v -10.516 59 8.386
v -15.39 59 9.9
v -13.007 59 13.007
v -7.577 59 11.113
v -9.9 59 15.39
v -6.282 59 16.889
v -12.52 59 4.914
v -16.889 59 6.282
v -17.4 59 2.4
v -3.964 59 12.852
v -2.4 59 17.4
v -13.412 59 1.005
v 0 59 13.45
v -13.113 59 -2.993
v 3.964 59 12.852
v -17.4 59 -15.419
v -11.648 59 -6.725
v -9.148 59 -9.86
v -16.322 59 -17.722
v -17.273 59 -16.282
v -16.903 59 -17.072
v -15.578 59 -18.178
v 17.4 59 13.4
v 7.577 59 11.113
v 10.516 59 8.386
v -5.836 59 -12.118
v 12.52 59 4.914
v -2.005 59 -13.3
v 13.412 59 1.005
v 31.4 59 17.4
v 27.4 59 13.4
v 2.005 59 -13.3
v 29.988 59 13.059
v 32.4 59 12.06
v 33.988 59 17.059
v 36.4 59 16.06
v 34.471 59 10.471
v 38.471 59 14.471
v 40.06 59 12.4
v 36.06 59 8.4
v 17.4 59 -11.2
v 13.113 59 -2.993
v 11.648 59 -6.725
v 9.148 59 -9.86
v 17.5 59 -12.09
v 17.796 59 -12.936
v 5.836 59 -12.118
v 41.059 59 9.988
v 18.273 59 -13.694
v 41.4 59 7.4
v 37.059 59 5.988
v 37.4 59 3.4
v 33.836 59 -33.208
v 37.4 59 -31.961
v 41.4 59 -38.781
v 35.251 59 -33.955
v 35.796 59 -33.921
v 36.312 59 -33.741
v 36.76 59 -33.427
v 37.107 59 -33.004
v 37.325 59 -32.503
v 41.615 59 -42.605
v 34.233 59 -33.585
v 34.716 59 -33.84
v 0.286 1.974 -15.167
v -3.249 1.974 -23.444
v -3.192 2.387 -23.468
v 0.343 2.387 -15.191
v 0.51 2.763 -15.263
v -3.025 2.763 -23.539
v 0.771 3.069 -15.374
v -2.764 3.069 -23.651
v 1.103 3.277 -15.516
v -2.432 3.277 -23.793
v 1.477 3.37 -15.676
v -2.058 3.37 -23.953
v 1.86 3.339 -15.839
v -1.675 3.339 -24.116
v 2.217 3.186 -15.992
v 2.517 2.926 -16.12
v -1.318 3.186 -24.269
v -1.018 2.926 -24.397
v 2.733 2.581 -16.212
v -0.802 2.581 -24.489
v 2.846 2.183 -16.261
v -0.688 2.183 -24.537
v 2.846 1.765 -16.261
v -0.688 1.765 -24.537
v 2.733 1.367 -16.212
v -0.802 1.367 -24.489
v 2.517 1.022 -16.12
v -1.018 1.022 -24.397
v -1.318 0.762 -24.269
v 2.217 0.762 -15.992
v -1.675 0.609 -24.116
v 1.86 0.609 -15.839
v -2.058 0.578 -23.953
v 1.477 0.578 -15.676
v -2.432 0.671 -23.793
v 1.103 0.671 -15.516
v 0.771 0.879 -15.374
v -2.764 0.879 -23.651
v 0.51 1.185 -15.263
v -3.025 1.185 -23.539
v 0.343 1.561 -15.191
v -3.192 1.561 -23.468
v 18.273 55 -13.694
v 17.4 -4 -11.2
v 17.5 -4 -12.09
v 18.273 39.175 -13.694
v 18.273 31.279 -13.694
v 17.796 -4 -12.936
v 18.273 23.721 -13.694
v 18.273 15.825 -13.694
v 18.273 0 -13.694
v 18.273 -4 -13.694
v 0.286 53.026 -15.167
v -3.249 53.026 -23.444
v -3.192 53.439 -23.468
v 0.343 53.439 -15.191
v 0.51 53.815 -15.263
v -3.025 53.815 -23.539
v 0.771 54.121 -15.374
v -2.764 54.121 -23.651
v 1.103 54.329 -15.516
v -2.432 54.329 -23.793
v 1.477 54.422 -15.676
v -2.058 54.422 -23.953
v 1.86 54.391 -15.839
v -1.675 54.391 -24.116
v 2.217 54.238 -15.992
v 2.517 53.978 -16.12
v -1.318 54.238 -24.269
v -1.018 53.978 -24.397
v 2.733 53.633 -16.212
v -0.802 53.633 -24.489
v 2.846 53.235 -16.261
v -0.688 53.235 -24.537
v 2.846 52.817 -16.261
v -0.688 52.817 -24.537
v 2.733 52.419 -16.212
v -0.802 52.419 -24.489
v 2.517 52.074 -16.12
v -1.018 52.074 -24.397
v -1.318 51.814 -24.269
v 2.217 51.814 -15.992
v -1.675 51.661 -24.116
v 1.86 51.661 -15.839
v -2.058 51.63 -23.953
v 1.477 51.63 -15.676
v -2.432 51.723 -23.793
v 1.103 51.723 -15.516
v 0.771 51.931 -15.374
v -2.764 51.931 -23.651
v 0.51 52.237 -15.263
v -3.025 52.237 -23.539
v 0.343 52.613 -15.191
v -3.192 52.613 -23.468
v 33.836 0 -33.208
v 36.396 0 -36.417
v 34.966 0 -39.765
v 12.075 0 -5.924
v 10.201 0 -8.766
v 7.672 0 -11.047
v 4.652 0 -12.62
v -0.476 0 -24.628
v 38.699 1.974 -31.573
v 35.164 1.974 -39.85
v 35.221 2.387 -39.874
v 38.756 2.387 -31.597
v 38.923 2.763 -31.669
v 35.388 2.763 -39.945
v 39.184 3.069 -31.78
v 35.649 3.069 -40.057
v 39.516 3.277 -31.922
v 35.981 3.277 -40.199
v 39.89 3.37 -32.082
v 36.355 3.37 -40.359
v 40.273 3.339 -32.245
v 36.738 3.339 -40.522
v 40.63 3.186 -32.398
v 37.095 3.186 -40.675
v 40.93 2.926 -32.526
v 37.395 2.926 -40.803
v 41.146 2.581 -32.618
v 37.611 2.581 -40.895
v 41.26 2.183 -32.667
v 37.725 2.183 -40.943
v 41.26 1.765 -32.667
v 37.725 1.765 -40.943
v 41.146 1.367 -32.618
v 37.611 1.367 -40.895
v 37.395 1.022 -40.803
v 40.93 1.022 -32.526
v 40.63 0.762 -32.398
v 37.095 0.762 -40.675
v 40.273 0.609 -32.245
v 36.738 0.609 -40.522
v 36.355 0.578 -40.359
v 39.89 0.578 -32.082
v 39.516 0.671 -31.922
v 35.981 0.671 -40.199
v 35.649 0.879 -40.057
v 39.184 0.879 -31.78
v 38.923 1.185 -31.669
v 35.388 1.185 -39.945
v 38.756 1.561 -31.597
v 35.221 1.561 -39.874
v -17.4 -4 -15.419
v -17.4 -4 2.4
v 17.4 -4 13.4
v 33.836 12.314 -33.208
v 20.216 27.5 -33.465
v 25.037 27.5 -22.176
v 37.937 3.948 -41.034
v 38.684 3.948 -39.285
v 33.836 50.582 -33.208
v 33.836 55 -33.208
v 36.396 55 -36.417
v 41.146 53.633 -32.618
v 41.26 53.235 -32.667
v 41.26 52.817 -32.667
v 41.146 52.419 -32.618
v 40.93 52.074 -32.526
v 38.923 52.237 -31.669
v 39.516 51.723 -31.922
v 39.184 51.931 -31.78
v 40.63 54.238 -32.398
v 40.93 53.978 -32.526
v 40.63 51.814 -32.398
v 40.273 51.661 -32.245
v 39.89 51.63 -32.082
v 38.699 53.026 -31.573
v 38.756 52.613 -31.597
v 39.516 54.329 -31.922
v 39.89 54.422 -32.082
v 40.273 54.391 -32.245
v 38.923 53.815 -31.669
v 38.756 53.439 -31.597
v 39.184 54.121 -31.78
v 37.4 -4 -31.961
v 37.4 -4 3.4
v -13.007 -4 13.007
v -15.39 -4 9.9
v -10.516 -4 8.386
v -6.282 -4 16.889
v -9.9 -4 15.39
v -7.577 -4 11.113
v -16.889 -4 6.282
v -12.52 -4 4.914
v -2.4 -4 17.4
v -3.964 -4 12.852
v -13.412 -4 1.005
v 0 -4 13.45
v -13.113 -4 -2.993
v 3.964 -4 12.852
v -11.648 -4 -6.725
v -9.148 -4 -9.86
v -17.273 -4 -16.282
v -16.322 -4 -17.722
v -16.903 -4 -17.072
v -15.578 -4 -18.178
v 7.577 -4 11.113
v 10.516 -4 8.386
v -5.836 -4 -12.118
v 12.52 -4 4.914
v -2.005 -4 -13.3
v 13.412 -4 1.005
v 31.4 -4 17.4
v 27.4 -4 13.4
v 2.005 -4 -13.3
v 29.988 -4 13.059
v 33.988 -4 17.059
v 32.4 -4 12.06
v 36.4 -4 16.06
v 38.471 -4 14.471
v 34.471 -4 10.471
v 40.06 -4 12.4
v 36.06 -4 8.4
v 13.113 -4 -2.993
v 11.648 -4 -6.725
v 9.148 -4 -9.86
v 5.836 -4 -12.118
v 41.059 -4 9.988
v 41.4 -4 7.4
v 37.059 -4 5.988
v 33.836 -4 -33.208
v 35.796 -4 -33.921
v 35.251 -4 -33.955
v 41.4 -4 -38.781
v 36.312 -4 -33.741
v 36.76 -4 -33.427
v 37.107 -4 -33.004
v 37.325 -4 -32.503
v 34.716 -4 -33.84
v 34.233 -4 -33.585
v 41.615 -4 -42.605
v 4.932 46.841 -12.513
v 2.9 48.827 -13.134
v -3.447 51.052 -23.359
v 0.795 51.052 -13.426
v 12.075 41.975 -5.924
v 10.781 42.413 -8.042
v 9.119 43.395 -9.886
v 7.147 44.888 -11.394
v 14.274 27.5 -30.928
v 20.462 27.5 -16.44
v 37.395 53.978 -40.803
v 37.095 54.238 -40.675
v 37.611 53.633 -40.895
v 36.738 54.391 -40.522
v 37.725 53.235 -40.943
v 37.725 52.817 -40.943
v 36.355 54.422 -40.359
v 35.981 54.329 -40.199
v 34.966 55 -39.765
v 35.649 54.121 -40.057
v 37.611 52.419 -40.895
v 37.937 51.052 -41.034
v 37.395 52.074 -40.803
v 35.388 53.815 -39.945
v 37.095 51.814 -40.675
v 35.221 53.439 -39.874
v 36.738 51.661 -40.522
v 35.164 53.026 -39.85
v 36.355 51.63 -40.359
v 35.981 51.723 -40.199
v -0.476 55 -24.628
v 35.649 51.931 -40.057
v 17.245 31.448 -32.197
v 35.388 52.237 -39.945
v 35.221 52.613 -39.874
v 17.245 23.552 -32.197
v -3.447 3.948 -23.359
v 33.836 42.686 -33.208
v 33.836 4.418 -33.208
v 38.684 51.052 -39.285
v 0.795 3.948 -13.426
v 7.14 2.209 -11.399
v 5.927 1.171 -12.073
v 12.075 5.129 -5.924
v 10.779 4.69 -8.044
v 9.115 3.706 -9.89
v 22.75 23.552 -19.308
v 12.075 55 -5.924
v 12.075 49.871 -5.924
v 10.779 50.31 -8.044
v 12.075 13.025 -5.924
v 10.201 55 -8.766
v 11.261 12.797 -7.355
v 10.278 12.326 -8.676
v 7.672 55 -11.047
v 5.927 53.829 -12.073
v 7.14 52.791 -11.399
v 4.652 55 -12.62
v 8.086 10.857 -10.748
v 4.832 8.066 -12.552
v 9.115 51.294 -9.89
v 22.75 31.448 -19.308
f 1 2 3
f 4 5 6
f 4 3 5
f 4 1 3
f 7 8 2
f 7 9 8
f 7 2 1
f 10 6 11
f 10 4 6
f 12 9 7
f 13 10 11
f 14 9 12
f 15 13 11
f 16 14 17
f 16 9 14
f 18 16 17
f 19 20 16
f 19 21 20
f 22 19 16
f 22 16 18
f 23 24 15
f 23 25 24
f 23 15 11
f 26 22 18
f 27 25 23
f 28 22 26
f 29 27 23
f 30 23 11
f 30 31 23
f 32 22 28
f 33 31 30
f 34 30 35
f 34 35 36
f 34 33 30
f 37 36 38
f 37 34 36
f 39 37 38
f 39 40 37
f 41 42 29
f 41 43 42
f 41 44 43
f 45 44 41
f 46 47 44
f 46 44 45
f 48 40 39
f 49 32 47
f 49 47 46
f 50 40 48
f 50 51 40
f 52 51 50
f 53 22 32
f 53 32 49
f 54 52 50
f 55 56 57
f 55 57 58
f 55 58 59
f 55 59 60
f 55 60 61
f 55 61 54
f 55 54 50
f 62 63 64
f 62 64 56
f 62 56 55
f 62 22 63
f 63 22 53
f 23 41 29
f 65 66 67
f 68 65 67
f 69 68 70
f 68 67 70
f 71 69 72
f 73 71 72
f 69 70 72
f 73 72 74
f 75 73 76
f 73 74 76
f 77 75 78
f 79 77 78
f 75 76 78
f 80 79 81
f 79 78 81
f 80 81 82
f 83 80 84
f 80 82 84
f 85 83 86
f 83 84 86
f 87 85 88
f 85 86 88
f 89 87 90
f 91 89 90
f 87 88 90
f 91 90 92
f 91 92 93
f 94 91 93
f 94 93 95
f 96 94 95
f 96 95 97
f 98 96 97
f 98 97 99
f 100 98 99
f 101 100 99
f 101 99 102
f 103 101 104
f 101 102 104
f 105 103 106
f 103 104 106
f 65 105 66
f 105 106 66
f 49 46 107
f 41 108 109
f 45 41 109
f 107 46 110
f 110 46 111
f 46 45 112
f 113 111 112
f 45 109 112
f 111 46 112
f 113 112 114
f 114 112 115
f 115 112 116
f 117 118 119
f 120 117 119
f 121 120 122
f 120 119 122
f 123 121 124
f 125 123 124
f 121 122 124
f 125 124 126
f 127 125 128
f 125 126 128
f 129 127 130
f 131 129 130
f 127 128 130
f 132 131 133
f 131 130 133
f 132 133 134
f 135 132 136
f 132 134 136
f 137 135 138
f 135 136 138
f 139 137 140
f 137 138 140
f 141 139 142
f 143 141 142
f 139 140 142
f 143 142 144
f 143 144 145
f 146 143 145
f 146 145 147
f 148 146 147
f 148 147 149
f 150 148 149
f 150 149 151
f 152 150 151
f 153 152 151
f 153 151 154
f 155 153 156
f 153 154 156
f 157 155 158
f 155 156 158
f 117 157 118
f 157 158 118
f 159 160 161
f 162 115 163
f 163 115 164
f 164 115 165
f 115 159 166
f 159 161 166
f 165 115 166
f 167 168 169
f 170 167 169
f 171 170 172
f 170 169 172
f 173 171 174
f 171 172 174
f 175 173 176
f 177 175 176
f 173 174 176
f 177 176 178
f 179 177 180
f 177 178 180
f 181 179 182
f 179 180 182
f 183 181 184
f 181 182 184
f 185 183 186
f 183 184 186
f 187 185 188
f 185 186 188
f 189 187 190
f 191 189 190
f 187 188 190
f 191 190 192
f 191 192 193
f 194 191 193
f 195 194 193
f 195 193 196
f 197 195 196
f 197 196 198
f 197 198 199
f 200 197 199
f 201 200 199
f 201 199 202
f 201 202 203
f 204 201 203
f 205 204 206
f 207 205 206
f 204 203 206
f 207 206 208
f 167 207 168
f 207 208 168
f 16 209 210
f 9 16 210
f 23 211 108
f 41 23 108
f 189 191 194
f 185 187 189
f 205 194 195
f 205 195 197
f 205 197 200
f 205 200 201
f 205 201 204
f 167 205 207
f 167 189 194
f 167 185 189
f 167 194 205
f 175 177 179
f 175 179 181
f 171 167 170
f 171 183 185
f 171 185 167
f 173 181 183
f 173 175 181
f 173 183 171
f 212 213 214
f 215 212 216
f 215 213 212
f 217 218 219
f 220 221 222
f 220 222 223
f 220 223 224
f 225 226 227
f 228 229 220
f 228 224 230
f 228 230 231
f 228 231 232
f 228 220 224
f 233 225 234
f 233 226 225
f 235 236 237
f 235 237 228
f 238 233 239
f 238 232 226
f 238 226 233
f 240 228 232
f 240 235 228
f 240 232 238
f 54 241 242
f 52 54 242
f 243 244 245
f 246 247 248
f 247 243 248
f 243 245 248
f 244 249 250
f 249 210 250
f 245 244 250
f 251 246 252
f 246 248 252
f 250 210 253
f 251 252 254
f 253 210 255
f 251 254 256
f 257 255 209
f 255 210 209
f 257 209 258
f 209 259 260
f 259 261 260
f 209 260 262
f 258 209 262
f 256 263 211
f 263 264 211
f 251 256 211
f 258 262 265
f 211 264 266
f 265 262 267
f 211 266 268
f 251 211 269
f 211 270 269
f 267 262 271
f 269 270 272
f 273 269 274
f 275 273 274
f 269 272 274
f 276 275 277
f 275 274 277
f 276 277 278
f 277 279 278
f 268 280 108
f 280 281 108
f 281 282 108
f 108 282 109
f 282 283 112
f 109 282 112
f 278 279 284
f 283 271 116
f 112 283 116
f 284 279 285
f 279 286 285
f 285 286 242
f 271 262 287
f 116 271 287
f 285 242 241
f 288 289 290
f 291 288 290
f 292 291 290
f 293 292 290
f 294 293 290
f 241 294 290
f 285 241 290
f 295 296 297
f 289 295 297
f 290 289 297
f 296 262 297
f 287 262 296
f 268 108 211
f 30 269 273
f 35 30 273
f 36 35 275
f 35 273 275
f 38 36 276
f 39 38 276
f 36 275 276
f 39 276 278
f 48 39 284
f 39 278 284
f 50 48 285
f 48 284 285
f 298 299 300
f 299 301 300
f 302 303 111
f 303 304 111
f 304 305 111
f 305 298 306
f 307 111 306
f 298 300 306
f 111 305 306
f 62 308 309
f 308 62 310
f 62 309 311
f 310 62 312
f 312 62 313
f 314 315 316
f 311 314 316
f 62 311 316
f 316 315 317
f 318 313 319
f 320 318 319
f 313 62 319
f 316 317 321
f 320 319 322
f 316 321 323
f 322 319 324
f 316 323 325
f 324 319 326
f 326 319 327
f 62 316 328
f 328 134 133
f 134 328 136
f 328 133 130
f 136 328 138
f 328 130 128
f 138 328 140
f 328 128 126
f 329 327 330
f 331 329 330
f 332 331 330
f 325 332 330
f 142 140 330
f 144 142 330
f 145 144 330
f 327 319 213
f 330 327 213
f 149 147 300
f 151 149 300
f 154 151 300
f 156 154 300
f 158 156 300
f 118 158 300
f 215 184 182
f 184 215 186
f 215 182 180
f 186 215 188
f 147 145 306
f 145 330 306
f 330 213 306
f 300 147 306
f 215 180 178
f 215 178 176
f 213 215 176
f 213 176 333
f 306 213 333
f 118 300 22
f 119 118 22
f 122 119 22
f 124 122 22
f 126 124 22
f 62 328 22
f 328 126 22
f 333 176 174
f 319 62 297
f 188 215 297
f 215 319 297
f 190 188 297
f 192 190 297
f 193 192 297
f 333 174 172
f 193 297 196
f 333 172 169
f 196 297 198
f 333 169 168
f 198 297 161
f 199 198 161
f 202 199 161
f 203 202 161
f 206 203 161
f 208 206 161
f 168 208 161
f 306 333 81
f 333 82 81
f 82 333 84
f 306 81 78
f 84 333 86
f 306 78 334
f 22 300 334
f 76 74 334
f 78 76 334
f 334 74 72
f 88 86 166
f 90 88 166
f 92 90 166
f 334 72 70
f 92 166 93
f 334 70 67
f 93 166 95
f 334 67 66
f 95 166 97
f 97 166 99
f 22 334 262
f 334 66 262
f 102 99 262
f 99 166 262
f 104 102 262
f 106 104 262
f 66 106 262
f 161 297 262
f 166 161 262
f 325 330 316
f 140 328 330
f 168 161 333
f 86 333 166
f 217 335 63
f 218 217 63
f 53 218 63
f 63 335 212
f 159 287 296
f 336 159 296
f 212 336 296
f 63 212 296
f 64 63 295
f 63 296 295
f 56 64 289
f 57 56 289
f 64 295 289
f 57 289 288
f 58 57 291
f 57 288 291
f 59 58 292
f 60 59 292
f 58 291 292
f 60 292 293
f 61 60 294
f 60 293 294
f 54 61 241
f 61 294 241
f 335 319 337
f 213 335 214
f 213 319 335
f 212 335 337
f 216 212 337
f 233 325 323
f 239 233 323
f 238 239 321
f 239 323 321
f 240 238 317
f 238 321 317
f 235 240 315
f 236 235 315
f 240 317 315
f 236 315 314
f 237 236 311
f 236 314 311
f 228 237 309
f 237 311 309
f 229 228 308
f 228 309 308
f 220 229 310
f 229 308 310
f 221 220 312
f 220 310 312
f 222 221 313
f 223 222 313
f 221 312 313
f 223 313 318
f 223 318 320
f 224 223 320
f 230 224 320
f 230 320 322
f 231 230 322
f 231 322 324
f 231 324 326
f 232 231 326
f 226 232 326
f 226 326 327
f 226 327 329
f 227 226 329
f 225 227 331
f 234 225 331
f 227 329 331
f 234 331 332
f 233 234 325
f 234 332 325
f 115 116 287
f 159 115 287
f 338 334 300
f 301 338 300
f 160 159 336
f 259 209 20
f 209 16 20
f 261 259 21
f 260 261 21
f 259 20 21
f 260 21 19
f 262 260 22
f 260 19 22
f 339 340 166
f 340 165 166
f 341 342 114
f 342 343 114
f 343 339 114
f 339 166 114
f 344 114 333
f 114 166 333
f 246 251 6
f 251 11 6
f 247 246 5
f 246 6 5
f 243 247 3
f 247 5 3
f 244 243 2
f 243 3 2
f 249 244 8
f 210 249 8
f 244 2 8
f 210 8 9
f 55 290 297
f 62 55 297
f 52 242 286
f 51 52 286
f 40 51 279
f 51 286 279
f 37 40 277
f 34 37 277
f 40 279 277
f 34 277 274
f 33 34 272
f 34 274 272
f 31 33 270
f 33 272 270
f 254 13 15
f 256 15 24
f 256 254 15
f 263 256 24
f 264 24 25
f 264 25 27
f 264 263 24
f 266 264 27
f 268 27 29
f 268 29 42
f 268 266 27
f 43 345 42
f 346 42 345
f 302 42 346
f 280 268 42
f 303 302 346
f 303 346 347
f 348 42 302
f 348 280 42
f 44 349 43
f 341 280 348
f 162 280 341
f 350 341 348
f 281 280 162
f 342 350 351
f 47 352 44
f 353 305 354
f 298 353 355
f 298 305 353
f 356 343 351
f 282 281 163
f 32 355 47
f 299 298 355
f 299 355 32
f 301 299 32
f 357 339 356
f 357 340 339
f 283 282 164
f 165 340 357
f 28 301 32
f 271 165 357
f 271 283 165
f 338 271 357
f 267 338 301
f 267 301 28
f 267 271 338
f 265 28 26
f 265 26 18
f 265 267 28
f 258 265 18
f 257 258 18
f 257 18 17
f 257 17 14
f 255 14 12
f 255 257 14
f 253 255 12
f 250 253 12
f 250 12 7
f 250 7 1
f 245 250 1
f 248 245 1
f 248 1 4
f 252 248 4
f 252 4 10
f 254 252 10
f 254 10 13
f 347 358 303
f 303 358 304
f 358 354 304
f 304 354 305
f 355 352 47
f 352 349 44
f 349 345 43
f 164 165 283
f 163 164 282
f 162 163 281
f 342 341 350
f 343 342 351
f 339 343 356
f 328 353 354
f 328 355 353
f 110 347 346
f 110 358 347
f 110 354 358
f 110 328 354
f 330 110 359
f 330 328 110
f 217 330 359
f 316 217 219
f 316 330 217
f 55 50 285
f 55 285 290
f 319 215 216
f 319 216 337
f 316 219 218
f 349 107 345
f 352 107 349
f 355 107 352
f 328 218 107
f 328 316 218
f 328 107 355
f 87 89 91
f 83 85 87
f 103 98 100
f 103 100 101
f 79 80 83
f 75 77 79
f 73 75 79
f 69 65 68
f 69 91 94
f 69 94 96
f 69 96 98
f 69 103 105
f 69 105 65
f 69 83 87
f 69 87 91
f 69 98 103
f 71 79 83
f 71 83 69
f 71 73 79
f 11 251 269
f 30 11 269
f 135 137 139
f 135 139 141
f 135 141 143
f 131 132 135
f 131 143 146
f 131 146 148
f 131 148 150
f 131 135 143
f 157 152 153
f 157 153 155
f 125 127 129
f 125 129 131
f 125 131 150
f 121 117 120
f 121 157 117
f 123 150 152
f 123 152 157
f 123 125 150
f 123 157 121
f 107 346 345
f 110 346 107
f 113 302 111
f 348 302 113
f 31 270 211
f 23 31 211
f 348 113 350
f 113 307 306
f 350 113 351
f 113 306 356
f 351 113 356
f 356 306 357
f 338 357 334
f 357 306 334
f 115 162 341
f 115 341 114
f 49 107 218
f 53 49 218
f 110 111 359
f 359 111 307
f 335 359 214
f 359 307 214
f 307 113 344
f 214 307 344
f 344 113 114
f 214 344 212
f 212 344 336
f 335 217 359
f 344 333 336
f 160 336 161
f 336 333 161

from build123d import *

# Parameters (mm, degrees)
BOSS_EXTRUDE1_DEPTH            = 59
BOSS_EXTRUDE1_DEPTH_BACK       = 4
SKETCH2_R                      = 13.45
FILLET1_R                      = 15
FILLET2_R                      = 3
CUT_EXTRUDE1_REACH             = 88.686
CUT_EXTRUDE1_DIRECTION_2_DEPTH = 87.685720739
SKETCH4_R                      = 1.4
CUT_EXTRUDE2_DEPTH             = 9


with BuildPart() as part:
    # Sketch2 → Boss-Extrude1 (new, two sides: drawn at the far end of the back side and taken through both)
    with BuildSketch(Plane(origin=(0, 0, 0), x_dir=(1, 0, 0), z_dir=(0, 1, 0)).offset(-BOSS_EXTRUDE1_DEPTH_BACK)):
        with BuildLine():
            Line((-17.4, -17.4), (17.4, -17.4))
            Line((17.4, -17.4), (31.4, -17.4))
            ThreePointArc((31.4, -17.4), (38.471067812, -14.471067812), (41.4, -7.4))
            Line((41.4, -7.4), (41.4, 38.781202895))
            Line((41.4, 38.781202895), (41.615303514, 42.605074323))
            Line((41.615303514, 42.605074323), (-17.4, 17.4))
            Line((-17.4, 17.4), (-17.4, -17.4))
        make_face()
        with Locations(Location((0, 0, 0), (0, 0, 270))):
            Circle(SKETCH2_R, mode=Mode.SUBTRACT)
        with BuildLine():
            Line((17.4, -13.4), (17.4, 11.200201908))
            ThreePointArc((17.4, 11.200201908), (17.624507156, 12.521433828), (18.272826893, 13.694352737))
            Line((18.272826893, 13.694352737), (33.836413447, 33.208019968))
            ThreePointArc((33.836413447, 33.208019968), (36.06061596, 33.848690975), (37.4, 31.960944553))
            Line((37.4, 31.960944553), (37.4, -3.4))
            ThreePointArc((37.4, -3.4), (34.471067812, -10.471067812), (27.4, -13.4))
            Line((27.4, -13.4), (17.4, -13.4))
        make_face(mode=Mode.SUBTRACT)
    extrude(amount=BOSS_EXTRUDE1_DEPTH + BOSS_EXTRUDE1_DEPTH_BACK)

    # Fillet1
    fillet1_edges = [part.edges().sort_by_distance(p)[0] for p in [
        (-17.4, 27.5, 17.4),
    ]]
    fillet(fillet1_edges, radius=FILLET1_R)

    # Fillet2
    fillet2_edges = [part.edges().sort_by_distance(p)[0] for p in [
        (-17.4, 27.5, -17.4),
    ]]
    fillet(fillet2_edges, radius=FILLET2_R)

    # Cut-Extrude1: up to this plane
    cut_extrude1_end = Plane(origin=(18.272826893, -4, -13.694352737), z_dir=(-0.7817932766673829, 0, -0.6235377074064384))
    # Sketch3 → Cut-Extrude1 (cut, up to the surface)
    with BuildSketch(Plane(origin=(-8.969274917, 0, -21.000710996), x_dir=(-0.9196362986724037, 0, 0.39277102510765927), z_dir=(-0.39277102510765927, 0, -0.9196362986724037)), mode=Mode.PRIVATE) as cut_extrude1_sk1:
        Polygon((-47.774830044, 0), (-9.235134773, 0), (-28.504982408, 23.552035999), align=None)
    cut_extrude1_tool1 = split(extrude(cut_extrude1_sk1.sketch, amount=-CUT_EXTRUDE1_REACH, mode=Mode.PRIVATE), bisect_by=cut_extrude1_end, keep=Keep.BOTH, mode=Mode.PRIVATE)
    add(cut_extrude1_tool1.solids().sort_by_distance((17.244942, 7.850679, -32.196642))[0], mode=Mode.SUBTRACT)
    # Sketch3 → Cut-Extrude1 (cut, up to the surface)
    with BuildSketch(Plane(origin=(-8.969274917, 0, -21.000710996), x_dir=(-0.9196362986724037, 0, 0.39277102510765927), z_dir=(-0.39277102510765927, 0, -0.9196362986724037)), mode=Mode.PRIVATE) as cut_extrude1_sk2:
        Polygon((-51.004982408, 3.947964001), (-51.004982408, 51.052035999), (-31.735134773, 27.5), align=None)
    cut_extrude1_tool2 = split(extrude(cut_extrude1_sk2.sketch, amount=-CUT_EXTRUDE1_REACH, mode=Mode.PRIVATE), bisect_by=cut_extrude1_end, keep=Keep.BOTH, mode=Mode.PRIVATE)
    add(cut_extrude1_tool2.solids().sort_by_distance((32.029675, 27.5, -38.511111))[0], mode=Mode.SUBTRACT)
    # Sketch3 → Cut-Extrude1 (cut, up to the surface)
    with BuildSketch(Plane(origin=(-8.969274917, 0, -21.000710996), x_dir=(-0.9196362986724037, 0, 0.39277102510765927), z_dir=(-0.39277102510765927, 0, -0.9196362986724037)), mode=Mode.PRIVATE) as cut_extrude1_sk3:
        Polygon((-47.774830044, 55), (-9.235134773, 55), (-28.504982408, 31.447964001), align=None)
    cut_extrude1_tool3 = split(extrude(cut_extrude1_sk3.sketch, amount=-CUT_EXTRUDE1_REACH, mode=Mode.PRIVATE), bisect_by=cut_extrude1_end, keep=Keep.BOTH, mode=Mode.PRIVATE)
    add(cut_extrude1_tool3.solids().sort_by_distance((17.244942, 47.149321, -32.196642))[0], mode=Mode.SUBTRACT)
    # Sketch3 → Cut-Extrude1 (cut, up to the surface)
    with BuildSketch(Plane(origin=(-8.969274917, 0, -21.000710996), x_dir=(-0.9196362986724037, 0, 0.39277102510765927), z_dir=(-0.39277102510765927, 0, -0.9196362986724037)), mode=Mode.PRIVATE) as cut_extrude1_sk4:
        Polygon((-6.004982408, 3.947964001), (-6.004982408, 51.052035999), (-25.274830044, 27.5), align=None)
    cut_extrude1_tool4 = split(extrude(cut_extrude1_sk4.sketch, amount=-CUT_EXTRUDE1_REACH, mode=Mode.PRIVATE), bisect_by=cut_extrude1_end, keep=Keep.BOTH, mode=Mode.PRIVATE)
    add(cut_extrude1_tool4.solids().sort_by_distance((2.460209, 27.5, -25.882173))[0], mode=Mode.SUBTRACT)

    # Sketch3 → Cut-Extrude1 direction 2 (cut)
    with BuildSketch(Plane(origin=(-8.969274917, 0, -21.000710996), x_dir=(-0.9196362986724037, 0, 0.39277102510765927), z_dir=(-0.39277102510765927, 0, -0.9196362986724037))):
        Polygon((-47.774830044, 0), (-9.235134773, 0), (-28.504982408, 23.552035999), align=None)
        Polygon((-51.004982408, 3.947964001), (-51.004982408, 51.052035999), (-31.735134773, 27.5), align=None)
        Polygon((-47.774830044, 55), (-9.235134773, 55), (-28.504982408, 31.447964001), align=None)
        Polygon((-6.004982408, 3.947964001), (-6.004982408, 51.052035999), (-25.274830044, 27.5), align=None)
    extrude(amount=CUT_EXTRUDE1_DIRECTION_2_DEPTH, mode=Mode.SUBTRACT)

    # Sketch4 → Cut-Extrude2 (cut)
    with BuildSketch(Plane(origin=(-8.969274917, 0, -21.000710996), x_dir=(-0.9196362986724037, 0, 0.3927710251076594), z_dir=(-0.3927710251076594, 0, -0.9196362986724037))):
        with Locations((-49.389906226, 1.973982)):
            Circle(SKETCH4_R)
        with Locations((-7.620058591, 1.973982)):
            Circle(SKETCH4_R)
        with Locations((-7.620058591, 53.026018)):
            Circle(SKETCH4_R)
        with Locations((-49.389906226, 53.026018)):
            Circle(SKETCH4_R)
    extrude(amount=-CUT_EXTRUDE2_DEPTH, mode=Mode.SUBTRACT)


solid = part.part
